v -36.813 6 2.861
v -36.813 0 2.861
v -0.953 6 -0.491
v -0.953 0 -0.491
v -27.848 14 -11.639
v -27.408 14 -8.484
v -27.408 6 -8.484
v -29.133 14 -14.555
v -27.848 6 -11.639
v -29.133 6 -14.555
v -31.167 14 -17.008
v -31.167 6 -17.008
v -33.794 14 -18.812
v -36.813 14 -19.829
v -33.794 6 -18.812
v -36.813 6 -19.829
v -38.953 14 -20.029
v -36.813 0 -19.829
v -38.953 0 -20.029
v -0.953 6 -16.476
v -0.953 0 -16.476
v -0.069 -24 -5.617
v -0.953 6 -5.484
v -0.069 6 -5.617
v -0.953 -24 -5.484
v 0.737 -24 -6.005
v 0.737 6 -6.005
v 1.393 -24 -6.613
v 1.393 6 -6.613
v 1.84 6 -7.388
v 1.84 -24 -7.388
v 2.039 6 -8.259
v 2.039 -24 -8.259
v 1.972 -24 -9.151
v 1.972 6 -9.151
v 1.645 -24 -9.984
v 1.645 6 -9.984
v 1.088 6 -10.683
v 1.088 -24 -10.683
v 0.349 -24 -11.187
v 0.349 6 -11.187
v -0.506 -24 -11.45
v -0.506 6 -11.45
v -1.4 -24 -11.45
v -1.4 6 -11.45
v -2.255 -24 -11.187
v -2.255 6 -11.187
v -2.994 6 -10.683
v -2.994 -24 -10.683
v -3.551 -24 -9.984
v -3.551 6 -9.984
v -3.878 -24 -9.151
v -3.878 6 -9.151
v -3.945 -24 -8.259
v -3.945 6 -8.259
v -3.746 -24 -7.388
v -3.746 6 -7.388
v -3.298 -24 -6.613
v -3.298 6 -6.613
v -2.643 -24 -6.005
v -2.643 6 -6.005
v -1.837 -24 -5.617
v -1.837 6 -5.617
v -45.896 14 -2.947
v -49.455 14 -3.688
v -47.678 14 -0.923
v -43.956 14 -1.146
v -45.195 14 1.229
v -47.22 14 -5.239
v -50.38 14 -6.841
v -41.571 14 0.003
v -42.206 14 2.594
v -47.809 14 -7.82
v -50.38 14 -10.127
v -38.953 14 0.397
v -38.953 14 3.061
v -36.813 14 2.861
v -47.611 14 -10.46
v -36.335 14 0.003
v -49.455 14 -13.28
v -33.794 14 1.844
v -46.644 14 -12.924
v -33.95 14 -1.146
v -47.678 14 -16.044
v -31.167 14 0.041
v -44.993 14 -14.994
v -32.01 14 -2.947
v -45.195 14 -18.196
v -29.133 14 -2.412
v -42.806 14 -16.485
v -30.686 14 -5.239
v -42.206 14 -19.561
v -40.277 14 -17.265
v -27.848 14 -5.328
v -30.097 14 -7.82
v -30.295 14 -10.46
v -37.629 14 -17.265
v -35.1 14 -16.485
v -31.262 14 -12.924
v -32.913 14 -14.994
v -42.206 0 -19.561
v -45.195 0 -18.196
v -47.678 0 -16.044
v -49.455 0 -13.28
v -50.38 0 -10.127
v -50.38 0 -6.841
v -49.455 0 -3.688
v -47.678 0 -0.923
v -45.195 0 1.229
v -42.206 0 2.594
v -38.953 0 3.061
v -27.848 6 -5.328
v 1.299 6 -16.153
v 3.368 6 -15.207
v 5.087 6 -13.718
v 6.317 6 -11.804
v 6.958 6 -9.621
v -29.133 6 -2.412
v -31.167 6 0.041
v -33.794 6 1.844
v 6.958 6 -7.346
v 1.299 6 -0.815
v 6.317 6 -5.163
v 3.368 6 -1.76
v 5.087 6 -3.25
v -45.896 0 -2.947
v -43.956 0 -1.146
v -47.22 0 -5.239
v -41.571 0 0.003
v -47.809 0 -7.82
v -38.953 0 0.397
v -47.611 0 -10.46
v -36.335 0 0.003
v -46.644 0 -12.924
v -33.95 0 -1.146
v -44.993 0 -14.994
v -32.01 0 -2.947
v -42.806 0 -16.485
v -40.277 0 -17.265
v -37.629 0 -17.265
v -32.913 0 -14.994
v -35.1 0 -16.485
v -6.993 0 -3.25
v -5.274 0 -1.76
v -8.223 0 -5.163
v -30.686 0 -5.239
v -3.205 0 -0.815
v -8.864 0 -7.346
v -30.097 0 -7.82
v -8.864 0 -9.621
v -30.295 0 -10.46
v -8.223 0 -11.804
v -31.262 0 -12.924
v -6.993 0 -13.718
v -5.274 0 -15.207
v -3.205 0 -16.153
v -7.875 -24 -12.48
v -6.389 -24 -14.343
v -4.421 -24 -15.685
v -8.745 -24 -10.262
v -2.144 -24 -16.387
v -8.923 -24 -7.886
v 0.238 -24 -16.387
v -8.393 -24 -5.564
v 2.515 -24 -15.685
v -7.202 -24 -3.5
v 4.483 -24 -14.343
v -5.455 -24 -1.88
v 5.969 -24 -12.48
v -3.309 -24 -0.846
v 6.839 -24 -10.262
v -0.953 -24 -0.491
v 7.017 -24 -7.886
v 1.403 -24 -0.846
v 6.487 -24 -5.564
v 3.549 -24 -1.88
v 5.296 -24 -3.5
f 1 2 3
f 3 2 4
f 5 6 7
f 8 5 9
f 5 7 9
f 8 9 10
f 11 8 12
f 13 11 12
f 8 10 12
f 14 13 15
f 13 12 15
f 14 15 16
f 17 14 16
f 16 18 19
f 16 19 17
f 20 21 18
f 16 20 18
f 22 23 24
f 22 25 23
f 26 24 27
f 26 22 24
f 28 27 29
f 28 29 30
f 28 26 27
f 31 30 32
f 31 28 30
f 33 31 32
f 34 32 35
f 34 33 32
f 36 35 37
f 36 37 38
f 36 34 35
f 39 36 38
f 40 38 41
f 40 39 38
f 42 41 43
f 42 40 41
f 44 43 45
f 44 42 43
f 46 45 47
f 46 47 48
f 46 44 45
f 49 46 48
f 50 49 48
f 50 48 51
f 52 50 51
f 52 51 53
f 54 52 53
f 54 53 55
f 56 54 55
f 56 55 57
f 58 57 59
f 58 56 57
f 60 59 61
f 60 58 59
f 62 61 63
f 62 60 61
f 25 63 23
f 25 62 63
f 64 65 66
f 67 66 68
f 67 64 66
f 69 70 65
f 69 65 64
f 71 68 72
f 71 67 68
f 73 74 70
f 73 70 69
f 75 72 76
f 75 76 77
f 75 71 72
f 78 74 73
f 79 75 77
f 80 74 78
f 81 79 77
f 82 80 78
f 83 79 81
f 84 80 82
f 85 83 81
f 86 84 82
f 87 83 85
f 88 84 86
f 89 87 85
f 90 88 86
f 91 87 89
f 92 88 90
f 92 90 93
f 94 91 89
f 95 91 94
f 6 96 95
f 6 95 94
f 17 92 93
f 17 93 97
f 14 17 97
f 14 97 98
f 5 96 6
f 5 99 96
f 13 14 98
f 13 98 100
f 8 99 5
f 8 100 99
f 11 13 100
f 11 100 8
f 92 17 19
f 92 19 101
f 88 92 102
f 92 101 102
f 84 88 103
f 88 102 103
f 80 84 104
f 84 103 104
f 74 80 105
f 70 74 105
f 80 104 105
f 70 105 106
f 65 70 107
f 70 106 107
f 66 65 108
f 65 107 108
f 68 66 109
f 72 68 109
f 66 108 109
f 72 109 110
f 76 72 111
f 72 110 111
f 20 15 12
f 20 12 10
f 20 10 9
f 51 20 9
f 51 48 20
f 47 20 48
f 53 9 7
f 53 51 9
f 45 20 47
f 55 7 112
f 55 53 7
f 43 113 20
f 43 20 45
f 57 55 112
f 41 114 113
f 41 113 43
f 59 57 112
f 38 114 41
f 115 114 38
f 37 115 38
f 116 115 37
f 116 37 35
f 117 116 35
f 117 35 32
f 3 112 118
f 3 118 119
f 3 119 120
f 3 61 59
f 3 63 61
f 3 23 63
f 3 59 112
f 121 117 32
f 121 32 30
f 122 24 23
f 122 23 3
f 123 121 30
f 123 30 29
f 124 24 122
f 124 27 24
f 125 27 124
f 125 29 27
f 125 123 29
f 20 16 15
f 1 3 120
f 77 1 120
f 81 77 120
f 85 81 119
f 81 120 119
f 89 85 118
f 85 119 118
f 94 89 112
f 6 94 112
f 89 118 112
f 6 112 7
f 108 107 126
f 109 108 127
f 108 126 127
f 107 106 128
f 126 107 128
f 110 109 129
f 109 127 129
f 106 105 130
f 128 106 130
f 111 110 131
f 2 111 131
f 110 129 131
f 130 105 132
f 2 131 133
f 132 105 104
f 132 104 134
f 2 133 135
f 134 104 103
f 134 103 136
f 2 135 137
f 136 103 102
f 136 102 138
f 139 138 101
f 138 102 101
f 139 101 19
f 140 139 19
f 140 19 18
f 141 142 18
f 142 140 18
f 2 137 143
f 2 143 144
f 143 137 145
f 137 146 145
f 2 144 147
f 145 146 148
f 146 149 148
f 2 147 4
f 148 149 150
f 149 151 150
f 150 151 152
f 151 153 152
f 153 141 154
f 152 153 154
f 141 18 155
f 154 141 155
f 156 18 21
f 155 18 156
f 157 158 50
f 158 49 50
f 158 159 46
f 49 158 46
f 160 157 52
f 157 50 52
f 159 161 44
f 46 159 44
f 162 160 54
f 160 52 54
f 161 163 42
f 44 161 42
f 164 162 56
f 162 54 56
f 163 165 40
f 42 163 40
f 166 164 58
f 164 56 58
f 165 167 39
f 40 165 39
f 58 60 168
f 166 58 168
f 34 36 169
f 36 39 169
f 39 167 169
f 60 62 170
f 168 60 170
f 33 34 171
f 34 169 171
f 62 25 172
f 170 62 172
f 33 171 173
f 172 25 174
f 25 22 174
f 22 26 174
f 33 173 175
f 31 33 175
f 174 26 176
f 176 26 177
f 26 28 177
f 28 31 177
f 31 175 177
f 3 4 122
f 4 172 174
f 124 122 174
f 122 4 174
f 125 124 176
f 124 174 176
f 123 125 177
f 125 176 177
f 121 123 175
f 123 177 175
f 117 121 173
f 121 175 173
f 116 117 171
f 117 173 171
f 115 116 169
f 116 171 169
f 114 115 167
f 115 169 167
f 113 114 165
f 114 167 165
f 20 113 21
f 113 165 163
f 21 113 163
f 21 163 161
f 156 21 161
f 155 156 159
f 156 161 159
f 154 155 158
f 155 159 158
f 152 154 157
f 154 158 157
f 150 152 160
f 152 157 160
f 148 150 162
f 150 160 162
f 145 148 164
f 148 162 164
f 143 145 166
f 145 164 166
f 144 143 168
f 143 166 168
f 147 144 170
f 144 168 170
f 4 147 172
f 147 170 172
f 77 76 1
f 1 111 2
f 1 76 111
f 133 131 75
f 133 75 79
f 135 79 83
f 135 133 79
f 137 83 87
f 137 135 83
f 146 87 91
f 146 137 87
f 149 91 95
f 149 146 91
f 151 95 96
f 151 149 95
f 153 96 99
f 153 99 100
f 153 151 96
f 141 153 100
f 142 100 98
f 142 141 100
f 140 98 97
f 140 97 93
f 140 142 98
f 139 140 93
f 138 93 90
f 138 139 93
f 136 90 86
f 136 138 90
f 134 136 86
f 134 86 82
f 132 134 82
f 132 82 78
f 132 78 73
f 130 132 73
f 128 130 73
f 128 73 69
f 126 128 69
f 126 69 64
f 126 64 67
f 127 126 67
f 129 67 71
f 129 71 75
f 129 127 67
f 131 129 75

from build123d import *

# Parameters (mm, degrees)
SKETCH2_R           = 8.88072163
BOSS_EXTRUDE3_DEPTH = 14
SKETCH2_4_R         = 3
BOSS_EXTRUDE4_DEPTH = 24
SKETCH2_5_R         = 3
BOSS_EXTRUDE5_DEPTH = 6


with BuildPart() as part:
    # Sketch2 → Boss-Extrude3 (new body)
    with BuildSketch(Plane(origin=(0, 0, 0), x_dir=(1, 0, 0), z_dir=(0, 1, 0))):
        with BuildLine():
            Line((-36.813210299, 19.828534504), (-38.952982558, 20.028563155))
            ThreePointArc((-38.952982558, 20.028563155), (-50.497920677, 8.483625036), (-38.952982558, -3.061313083))
            Line((-38.952982558, -3.061313083), (-36.813210299, -2.861284433))
            ThreePointArc((-36.813210299, -2.861284433), (-30.065093762, 1.115380406), (-27.408044439, 8.483625036))
            ThreePointArc((-27.408044439, 8.483625036), (-30.065093762, 15.851869666), (-36.813210299, 19.828534504))
        make_face()
        with Locations((-38.952982558, 8.483625036)):
            Circle(SKETCH2_R, mode=Mode.SUBTRACT)
    extrude(amount=BOSS_EXTRUDE3_DEPTH)



with BuildPart() as body_2:
    # Sketch2<4> → Boss-Extrude4 (new body)
    with BuildSketch(Plane(origin=(0, 0, 0), x_dir=(1, 0, 0), z_dir=(0, 1, 0))):
        with BuildLine():
            ThreePointArc((7.039666909, 8.483625036), (4.69867408, 14.135281673), (-0.952982558, 16.476274503))
            ThreePointArc((-0.952982558, 16.476274503), (-8.945632025, 8.483625036), (-0.952982558, 0.490975569))
            ThreePointArc((-0.952982558, 0.490975569), (4.69867408, 2.831968398), (7.039666909, 8.483625036))
        make_face()
        with Locations((-0.952982558, 8.483625036)):
            Circle(SKETCH2_4_R, mode=Mode.SUBTRACT)
    extrude(amount=-BOSS_EXTRUDE4_DEPTH)


with BuildPart() as part_1:
    add(part.part)

    add(body_2.part)  # Boss-Extrude5 merges body 2
    # Sketch2<5> → Boss-Extrude5 (add)
    with BuildSketch(Plane(origin=(0, 0, 0), x_dir=(1, 0, 0), z_dir=(0, 1, 0))):
        with BuildLine():
            Line((-0.952982558, 16.476274503), (-36.813210299, 19.828534504))
            ThreePointArc((-36.813210299, 19.828534504), (-27.408044439, 8.483625036), (-36.813210299, -2.861284433))
            Line((-36.813210299, -2.861284433), (-0.952982558, 0.490975569))
            ThreePointArc((-0.952982558, 0.490975569), (7.039666909, 8.483625036), (-0.952982558, 16.476274503))
        make_face()
        with Locations((-0.952982558, 8.483625036)):
            Circle(SKETCH2_5_R, mode=Mode.SUBTRACT)
    extrude(amount=BOSS_EXTRUDE5_DEPTH)


solid = part_1.part
